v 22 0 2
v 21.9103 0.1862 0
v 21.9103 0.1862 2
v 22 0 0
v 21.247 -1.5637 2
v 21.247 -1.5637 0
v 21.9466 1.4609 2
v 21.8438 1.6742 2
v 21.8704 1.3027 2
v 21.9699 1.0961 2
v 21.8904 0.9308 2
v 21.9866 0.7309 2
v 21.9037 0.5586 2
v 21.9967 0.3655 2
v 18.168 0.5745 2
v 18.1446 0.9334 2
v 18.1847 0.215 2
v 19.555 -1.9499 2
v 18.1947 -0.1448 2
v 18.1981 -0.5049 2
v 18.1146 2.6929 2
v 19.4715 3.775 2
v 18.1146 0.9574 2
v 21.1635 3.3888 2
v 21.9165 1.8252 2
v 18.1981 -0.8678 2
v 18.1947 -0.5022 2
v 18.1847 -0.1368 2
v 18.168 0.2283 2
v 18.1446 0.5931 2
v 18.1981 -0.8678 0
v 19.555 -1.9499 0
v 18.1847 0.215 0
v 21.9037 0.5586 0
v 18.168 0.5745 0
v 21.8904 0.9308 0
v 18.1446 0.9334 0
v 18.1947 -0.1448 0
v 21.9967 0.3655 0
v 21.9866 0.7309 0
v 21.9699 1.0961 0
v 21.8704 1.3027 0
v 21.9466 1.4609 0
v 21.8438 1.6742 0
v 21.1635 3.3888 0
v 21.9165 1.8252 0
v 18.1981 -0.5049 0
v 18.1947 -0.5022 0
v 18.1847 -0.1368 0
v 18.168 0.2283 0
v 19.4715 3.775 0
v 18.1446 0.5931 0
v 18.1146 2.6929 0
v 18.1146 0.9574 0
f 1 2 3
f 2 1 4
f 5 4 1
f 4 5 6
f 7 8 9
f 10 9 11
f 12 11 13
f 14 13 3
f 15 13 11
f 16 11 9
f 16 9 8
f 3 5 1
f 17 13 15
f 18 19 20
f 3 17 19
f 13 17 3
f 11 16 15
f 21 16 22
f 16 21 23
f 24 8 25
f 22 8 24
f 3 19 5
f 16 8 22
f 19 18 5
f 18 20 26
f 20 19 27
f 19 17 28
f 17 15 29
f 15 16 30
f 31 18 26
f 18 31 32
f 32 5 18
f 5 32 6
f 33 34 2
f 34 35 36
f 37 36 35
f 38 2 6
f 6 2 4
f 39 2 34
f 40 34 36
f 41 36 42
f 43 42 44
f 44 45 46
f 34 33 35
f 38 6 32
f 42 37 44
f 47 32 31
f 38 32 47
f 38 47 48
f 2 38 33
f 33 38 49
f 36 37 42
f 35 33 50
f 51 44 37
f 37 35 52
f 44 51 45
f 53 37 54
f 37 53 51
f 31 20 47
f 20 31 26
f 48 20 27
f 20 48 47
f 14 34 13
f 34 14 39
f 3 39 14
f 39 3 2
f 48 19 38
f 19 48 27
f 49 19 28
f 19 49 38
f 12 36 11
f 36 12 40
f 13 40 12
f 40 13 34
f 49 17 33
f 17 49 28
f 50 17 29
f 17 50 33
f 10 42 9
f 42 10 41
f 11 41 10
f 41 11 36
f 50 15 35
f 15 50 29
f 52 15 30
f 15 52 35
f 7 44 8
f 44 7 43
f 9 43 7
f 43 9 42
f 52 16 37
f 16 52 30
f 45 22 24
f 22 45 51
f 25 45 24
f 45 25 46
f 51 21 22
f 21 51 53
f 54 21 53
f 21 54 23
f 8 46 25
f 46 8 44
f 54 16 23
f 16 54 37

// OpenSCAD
// expect: takes degrees in OpenSCAD, but this uses PI
// fix: translate([r * cos(i * 180 / 3), r * sin(i * PI / 3), 0])
r = 20;
for (i = [0:5]) translate([r * cos(i * PI / 3), r * sin(i * PI / 3), 0]) cylinder(d = 4, h = 2);
